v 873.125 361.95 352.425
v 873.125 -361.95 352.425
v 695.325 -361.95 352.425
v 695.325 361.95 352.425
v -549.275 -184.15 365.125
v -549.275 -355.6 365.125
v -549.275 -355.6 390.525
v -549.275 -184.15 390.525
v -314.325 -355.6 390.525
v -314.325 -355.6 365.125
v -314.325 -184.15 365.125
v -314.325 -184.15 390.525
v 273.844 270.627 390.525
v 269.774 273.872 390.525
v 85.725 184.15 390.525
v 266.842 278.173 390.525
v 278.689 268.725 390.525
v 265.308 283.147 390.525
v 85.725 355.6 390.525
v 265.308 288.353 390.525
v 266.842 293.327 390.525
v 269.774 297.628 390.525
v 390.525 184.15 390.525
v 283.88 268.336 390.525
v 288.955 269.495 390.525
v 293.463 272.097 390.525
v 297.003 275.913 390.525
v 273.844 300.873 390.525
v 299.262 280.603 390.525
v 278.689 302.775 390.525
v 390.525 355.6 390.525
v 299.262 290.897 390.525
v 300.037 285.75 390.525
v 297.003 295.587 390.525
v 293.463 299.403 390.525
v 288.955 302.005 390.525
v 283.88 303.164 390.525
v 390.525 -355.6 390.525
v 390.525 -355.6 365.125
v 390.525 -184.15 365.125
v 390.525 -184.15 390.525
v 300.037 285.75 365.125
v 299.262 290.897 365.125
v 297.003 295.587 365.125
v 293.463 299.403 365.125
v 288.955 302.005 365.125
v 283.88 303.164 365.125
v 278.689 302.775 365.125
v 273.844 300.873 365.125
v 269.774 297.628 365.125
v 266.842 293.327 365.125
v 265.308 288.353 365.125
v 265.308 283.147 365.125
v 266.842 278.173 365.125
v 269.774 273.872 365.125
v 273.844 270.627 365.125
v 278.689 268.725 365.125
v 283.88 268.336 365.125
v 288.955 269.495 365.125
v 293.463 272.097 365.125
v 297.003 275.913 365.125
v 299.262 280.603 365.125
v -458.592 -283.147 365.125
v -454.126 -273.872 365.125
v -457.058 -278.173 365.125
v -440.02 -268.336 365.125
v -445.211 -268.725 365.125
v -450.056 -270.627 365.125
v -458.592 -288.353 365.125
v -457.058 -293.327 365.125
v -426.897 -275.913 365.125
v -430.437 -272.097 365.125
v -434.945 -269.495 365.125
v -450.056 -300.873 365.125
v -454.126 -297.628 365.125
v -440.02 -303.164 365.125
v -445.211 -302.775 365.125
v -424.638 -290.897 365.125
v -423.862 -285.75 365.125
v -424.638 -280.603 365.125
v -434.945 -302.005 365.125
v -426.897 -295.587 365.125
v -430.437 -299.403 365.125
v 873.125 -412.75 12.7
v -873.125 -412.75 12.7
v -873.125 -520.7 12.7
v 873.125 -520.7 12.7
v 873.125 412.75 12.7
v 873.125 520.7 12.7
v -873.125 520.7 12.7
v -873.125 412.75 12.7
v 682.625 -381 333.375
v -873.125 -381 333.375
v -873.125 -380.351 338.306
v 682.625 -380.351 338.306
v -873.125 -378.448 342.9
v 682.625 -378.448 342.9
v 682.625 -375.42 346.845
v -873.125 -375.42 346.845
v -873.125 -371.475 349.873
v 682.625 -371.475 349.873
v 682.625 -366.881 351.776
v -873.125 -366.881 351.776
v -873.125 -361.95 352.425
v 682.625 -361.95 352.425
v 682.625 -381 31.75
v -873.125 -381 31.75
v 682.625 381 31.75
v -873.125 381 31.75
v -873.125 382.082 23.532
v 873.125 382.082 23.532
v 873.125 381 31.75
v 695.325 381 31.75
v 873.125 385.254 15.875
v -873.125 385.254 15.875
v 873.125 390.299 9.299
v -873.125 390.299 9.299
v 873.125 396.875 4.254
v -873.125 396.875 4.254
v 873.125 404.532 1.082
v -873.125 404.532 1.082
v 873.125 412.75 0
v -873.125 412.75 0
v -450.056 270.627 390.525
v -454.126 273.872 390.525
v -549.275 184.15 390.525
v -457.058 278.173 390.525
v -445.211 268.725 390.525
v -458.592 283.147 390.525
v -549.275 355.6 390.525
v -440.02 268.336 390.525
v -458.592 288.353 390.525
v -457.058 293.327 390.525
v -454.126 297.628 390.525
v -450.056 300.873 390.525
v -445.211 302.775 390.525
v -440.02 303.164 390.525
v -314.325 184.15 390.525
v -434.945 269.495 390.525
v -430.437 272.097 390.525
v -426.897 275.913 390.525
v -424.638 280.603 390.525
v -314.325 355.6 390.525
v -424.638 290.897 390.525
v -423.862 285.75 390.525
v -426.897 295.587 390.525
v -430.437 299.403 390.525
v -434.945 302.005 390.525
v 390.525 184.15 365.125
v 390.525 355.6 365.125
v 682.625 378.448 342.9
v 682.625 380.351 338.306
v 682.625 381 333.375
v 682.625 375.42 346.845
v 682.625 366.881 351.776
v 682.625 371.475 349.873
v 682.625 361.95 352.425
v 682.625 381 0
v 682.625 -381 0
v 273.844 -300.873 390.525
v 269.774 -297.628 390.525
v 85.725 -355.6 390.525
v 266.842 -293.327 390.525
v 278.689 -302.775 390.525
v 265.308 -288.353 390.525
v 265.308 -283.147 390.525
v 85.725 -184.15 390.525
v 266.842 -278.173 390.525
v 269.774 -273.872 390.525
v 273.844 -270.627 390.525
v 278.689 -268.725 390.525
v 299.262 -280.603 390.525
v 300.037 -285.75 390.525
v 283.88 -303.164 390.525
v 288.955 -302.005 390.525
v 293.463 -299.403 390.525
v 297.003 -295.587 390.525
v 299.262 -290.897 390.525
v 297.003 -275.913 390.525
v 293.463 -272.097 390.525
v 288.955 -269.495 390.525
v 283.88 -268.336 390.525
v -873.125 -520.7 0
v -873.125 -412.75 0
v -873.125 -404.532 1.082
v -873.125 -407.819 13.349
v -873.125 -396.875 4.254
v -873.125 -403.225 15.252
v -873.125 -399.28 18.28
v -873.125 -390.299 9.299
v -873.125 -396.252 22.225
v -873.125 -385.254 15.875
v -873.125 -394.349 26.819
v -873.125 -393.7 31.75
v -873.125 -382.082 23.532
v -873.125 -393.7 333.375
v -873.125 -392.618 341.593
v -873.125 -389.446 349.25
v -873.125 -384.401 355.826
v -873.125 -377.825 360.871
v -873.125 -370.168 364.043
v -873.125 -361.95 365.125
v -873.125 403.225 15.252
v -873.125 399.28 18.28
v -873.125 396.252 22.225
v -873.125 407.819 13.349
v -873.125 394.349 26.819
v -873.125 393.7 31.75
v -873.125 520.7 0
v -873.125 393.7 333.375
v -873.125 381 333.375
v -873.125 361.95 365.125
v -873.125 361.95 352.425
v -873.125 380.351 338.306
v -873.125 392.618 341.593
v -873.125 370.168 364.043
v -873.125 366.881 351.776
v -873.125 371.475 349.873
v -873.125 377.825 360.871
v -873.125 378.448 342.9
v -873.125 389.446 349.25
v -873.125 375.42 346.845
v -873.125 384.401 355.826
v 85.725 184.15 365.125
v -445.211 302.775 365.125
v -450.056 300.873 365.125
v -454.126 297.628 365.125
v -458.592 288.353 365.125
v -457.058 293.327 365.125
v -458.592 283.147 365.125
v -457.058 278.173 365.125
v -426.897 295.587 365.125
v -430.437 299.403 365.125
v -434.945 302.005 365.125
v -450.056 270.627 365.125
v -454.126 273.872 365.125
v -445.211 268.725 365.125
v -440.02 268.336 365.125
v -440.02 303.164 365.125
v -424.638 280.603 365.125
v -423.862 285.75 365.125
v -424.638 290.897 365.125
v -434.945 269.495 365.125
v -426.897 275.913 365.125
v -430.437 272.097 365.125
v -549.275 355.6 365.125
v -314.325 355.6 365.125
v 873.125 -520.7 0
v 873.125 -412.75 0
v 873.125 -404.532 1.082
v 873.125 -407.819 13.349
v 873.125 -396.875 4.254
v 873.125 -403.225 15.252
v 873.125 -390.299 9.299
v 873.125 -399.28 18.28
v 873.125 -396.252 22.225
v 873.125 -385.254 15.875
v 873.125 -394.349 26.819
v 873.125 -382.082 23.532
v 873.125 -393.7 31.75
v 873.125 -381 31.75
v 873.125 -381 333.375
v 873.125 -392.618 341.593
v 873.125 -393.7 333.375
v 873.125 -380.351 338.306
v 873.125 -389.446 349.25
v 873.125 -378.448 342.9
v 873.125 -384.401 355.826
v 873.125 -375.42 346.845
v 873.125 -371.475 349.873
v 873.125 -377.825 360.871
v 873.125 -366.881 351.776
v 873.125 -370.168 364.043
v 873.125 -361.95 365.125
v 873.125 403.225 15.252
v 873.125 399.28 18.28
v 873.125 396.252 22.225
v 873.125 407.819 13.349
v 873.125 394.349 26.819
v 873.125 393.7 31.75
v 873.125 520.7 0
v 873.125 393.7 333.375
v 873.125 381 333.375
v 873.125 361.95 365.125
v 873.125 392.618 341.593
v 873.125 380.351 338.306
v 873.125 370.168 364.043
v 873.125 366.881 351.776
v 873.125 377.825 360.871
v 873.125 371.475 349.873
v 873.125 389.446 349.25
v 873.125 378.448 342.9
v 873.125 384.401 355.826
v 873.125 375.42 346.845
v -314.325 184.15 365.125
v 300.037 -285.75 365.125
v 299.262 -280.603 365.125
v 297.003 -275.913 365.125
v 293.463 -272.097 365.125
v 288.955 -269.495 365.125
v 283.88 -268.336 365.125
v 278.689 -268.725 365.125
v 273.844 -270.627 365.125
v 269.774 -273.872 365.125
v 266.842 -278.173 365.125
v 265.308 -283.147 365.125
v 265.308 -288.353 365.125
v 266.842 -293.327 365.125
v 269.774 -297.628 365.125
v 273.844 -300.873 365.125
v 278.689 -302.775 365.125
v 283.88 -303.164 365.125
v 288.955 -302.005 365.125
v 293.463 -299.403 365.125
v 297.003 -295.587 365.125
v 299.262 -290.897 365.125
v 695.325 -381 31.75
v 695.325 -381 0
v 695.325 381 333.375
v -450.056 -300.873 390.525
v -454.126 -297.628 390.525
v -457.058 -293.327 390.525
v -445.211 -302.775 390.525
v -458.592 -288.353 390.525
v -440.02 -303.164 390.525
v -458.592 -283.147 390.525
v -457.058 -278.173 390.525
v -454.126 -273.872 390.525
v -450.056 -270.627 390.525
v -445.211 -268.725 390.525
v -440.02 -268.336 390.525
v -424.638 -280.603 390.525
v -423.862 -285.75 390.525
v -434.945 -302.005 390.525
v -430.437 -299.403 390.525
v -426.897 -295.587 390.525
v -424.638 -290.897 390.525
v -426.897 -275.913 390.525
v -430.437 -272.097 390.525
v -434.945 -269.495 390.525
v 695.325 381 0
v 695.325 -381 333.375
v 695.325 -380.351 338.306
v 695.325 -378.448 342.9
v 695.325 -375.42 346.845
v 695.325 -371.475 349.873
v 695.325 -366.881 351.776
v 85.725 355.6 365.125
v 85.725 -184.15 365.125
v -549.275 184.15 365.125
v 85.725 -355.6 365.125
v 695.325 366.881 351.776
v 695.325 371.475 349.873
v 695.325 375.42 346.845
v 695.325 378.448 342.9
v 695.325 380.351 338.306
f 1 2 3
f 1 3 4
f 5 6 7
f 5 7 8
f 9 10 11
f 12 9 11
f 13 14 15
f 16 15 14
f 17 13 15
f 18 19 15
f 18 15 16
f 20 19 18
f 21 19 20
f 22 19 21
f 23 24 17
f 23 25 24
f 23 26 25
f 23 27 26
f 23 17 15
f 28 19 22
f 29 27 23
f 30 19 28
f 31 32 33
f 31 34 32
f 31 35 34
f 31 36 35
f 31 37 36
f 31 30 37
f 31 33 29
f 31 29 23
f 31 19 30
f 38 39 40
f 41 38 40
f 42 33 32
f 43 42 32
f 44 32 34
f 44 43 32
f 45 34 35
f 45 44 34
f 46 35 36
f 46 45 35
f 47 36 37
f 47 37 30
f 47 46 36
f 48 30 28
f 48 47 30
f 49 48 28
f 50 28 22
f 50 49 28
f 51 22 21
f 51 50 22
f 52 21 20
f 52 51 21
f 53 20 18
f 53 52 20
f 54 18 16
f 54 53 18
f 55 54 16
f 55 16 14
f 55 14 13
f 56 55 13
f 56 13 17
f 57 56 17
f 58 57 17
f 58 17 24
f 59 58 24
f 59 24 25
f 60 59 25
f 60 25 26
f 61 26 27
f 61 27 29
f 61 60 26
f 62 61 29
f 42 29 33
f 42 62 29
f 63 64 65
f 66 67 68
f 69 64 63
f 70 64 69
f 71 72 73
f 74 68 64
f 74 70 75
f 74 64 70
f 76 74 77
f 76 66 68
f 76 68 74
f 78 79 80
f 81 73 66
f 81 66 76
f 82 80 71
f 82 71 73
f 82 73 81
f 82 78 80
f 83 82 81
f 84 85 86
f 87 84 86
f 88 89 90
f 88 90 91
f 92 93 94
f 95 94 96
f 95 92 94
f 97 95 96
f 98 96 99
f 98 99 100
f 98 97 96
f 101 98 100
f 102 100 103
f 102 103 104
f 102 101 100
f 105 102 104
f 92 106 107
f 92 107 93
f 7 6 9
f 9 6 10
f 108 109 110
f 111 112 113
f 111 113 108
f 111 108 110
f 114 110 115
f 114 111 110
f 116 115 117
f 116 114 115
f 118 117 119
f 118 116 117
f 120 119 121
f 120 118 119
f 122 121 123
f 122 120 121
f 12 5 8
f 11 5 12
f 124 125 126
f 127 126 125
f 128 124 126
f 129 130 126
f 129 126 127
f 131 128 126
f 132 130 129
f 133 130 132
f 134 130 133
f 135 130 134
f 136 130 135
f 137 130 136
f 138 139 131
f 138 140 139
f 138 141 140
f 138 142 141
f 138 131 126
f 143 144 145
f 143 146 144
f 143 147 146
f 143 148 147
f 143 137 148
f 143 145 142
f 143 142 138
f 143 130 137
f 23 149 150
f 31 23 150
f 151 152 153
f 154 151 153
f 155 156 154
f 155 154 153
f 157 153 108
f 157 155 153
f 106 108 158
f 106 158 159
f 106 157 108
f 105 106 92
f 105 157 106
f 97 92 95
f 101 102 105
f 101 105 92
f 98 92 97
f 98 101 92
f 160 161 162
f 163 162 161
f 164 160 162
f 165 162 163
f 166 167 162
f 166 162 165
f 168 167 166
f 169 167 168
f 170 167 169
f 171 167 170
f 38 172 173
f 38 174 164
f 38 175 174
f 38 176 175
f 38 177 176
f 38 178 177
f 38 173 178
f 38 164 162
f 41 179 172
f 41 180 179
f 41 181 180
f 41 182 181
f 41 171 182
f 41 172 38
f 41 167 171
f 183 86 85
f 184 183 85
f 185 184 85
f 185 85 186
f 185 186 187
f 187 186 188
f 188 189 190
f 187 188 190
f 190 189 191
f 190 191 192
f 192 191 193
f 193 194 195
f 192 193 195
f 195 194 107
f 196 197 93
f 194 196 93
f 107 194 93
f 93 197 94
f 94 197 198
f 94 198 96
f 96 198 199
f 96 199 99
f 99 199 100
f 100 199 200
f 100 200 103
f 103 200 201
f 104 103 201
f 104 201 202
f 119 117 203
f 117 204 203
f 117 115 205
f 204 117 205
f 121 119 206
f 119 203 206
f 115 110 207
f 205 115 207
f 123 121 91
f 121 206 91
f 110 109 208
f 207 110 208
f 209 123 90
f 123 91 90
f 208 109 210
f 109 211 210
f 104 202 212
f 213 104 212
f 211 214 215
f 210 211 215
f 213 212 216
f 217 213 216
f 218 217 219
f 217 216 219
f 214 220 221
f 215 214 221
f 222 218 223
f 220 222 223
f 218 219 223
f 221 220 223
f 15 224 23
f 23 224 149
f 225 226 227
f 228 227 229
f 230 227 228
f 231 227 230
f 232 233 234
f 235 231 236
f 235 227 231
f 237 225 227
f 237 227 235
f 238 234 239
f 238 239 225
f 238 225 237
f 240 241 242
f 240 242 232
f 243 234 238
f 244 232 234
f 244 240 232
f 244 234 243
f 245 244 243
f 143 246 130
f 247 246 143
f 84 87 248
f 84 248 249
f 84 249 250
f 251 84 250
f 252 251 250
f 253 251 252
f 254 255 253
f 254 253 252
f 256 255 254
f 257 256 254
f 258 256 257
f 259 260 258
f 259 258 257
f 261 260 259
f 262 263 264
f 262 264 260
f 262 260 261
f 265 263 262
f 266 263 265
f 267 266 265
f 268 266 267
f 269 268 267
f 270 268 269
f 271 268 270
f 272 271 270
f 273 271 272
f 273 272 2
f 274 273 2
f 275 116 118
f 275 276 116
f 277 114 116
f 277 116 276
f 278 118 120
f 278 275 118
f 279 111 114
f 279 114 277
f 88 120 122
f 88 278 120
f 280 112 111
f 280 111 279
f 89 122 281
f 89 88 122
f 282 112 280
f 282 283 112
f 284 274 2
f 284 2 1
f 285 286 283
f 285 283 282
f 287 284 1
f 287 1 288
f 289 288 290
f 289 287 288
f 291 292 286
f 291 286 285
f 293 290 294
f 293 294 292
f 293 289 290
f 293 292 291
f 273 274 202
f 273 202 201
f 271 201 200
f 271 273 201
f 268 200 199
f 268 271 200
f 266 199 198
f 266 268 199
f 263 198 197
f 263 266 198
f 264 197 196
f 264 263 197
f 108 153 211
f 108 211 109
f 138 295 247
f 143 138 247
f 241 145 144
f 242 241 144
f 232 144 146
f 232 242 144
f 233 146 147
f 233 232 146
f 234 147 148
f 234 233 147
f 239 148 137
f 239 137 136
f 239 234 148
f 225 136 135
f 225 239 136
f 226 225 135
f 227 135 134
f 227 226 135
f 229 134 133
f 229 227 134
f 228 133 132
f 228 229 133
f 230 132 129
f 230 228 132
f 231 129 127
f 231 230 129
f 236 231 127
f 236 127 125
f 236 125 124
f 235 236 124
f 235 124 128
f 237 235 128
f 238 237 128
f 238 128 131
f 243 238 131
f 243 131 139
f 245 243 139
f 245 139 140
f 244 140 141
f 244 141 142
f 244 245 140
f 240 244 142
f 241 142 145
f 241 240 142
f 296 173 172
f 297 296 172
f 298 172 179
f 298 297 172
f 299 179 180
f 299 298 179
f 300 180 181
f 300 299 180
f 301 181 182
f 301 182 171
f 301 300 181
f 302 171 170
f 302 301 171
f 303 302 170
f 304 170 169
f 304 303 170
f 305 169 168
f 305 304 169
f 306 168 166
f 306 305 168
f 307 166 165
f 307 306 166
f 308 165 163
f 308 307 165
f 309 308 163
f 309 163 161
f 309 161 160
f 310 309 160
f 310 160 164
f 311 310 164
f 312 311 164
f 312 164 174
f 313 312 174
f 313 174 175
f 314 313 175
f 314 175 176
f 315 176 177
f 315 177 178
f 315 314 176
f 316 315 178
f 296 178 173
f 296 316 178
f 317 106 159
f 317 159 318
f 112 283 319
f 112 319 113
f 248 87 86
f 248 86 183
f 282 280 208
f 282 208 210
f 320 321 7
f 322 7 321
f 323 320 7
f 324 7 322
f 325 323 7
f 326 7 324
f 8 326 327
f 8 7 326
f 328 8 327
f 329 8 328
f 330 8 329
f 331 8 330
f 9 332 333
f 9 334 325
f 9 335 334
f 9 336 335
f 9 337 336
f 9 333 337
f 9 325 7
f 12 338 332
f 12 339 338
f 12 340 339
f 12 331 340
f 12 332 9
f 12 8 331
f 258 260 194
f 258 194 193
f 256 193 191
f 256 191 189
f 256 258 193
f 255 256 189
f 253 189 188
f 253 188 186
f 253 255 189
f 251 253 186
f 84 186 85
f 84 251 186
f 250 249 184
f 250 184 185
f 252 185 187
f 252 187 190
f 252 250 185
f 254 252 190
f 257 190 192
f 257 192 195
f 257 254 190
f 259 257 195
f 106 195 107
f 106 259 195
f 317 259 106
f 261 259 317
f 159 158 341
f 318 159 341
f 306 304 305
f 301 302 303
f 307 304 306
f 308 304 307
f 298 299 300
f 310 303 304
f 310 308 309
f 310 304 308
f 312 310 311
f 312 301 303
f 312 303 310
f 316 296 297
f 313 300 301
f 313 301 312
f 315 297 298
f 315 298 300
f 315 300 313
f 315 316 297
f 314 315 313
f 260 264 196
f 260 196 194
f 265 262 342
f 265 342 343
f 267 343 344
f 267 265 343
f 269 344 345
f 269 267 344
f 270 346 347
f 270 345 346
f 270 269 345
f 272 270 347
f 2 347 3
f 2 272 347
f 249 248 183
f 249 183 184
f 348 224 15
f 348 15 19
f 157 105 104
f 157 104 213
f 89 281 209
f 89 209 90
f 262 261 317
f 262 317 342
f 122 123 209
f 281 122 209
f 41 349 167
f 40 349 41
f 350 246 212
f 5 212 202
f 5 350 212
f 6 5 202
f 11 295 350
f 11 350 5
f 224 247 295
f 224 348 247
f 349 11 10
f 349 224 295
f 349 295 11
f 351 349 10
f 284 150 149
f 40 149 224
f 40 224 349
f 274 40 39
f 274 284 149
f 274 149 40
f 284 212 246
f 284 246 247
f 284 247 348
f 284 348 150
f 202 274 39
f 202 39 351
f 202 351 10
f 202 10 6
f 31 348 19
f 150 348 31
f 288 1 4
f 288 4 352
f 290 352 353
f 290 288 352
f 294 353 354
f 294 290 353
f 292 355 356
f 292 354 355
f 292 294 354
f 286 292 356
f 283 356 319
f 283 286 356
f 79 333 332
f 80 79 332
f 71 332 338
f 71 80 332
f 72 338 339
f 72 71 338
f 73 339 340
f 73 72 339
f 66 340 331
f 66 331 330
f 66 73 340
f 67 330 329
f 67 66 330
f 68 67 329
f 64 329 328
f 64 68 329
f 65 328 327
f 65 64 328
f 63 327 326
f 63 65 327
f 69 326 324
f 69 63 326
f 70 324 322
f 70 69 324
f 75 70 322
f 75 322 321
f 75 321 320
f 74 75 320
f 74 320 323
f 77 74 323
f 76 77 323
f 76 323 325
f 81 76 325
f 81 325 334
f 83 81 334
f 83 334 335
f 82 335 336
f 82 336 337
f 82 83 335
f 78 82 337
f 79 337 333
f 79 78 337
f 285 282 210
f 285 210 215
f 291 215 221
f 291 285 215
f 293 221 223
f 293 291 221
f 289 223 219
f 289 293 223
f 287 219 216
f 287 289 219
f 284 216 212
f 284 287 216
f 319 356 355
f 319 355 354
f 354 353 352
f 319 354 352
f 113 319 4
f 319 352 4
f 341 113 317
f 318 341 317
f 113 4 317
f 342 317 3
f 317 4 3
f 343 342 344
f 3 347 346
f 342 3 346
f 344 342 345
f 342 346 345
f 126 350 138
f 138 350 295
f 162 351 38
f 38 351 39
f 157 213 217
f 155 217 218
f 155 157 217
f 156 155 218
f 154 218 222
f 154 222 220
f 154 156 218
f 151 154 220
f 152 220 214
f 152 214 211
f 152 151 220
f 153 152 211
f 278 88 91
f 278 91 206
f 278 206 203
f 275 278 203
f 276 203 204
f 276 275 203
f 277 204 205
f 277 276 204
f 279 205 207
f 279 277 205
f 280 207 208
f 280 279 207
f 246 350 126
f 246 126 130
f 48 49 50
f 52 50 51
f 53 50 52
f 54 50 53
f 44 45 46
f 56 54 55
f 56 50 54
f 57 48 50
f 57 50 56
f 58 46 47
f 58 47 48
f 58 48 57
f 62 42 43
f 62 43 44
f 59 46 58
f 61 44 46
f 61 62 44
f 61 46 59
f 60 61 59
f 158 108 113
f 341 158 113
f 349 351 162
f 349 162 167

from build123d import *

# Parameters (mm, degrees)
F1_DEPTH = 873.125
F2_W     = 304.8
F2_H     = 171.45
F2_R     = 17.4625
F2_W_2   = 234.95
F3_DEPTH = 25.4
F4_W     = 12.7
F4_H     = 762
F5_DEPTH = 352.425


with BuildPart() as f1:
    # F0 (on Right) → F1 (new body, symmetric)
    with BuildSketch(Plane.YZ):
        with BuildLine():
            ThreePointArc((381, 31.75), (390.29936, 9.29936), (412.75, 0))
            Line((412.75, 0), (520.7, 0))
            Line((520.7, 0), (520.7, 12.7))
            Line((520.7, 12.7), (412.75, 12.7))
            ThreePointArc((412.75, 12.7), (399.279616, 18.279616), (393.7, 31.75))
            Line((393.7, 31.75), (393.7, 333.375))
            ThreePointArc((393.7, 333.375), (384.40064, 355.82564), (361.95, 365.125))
            Line((361.95, 365.125), (0, 365.125))
            Line((0, 365.125), (-361.95, 365.125))
            ThreePointArc((-361.95, 365.125), (-384.40064, 355.82564), (-393.7, 333.375))
            Line((-393.7, 333.375), (-393.7, 31.75))
            ThreePointArc((-393.7, 31.75), (-399.279616, 18.279616), (-412.75, 12.7))
            Line((-412.75, 12.7), (-520.7, 12.7))
            Line((-520.7, 12.7), (-520.7, 0))
            Line((-520.7, 0), (-412.75, 0))
            ThreePointArc((-412.75, 0), (-390.29936, 9.29936), (-381, 31.75))
            Line((-381, 31.75), (-381, 333.375))
            ThreePointArc((-381, 333.375), (-375.420384, 346.845384), (-361.95, 352.425))
            Line((-361.95, 352.425), (0, 352.425))
            Line((0, 352.425), (361.95, 352.425))
            ThreePointArc((361.95, 352.425), (375.420384, 346.845384), (381, 333.375))
            Line((381, 333.375), (381, 31.75))
        make_face()
    extrude(amount=F1_DEPTH, both=True)

    # F2 (on face) → F3 (join)
    with BuildSketch(Plane.XY.offset(365.125)):
        with Locations((238.125, 269.875)):
            Rectangle(F2_W, F2_H)
        with Locations((282.575, 285.75)):
            Circle(F2_R, mode=Mode.SUBTRACT)
        with Locations((-431.8, 269.875)):
            Rectangle(F2_W_2, F2_H)
        with Locations((-441.325, 285.75)):
            Circle(F2_R, mode=Mode.SUBTRACT)
        with Locations((238.125, -269.875)):
            Rectangle(F2_W, F2_H)
        with Locations((282.575, -285.75)):
            Circle(F2_R, mode=Mode.SUBTRACT)
        with Locations((-431.8, -269.875)):
            Rectangle(F2_W_2, F2_H)
        with Locations((-441.325, -285.75)):
            Circle(F2_R, mode=Mode.SUBTRACT)
    extrude(amount=F3_DEPTH)

    # F4 (on face) → F5 (join, through all)
    with BuildSketch(Plane(origin=(0, 0, 352.425), x_dir=(1, 0, 0), z_dir=(0, 0, -1))):
        with Locations((688.975, 0)):
            Rectangle(F4_W, F4_H)
    extrude(amount=F5_DEPTH)


solid = f1.part
